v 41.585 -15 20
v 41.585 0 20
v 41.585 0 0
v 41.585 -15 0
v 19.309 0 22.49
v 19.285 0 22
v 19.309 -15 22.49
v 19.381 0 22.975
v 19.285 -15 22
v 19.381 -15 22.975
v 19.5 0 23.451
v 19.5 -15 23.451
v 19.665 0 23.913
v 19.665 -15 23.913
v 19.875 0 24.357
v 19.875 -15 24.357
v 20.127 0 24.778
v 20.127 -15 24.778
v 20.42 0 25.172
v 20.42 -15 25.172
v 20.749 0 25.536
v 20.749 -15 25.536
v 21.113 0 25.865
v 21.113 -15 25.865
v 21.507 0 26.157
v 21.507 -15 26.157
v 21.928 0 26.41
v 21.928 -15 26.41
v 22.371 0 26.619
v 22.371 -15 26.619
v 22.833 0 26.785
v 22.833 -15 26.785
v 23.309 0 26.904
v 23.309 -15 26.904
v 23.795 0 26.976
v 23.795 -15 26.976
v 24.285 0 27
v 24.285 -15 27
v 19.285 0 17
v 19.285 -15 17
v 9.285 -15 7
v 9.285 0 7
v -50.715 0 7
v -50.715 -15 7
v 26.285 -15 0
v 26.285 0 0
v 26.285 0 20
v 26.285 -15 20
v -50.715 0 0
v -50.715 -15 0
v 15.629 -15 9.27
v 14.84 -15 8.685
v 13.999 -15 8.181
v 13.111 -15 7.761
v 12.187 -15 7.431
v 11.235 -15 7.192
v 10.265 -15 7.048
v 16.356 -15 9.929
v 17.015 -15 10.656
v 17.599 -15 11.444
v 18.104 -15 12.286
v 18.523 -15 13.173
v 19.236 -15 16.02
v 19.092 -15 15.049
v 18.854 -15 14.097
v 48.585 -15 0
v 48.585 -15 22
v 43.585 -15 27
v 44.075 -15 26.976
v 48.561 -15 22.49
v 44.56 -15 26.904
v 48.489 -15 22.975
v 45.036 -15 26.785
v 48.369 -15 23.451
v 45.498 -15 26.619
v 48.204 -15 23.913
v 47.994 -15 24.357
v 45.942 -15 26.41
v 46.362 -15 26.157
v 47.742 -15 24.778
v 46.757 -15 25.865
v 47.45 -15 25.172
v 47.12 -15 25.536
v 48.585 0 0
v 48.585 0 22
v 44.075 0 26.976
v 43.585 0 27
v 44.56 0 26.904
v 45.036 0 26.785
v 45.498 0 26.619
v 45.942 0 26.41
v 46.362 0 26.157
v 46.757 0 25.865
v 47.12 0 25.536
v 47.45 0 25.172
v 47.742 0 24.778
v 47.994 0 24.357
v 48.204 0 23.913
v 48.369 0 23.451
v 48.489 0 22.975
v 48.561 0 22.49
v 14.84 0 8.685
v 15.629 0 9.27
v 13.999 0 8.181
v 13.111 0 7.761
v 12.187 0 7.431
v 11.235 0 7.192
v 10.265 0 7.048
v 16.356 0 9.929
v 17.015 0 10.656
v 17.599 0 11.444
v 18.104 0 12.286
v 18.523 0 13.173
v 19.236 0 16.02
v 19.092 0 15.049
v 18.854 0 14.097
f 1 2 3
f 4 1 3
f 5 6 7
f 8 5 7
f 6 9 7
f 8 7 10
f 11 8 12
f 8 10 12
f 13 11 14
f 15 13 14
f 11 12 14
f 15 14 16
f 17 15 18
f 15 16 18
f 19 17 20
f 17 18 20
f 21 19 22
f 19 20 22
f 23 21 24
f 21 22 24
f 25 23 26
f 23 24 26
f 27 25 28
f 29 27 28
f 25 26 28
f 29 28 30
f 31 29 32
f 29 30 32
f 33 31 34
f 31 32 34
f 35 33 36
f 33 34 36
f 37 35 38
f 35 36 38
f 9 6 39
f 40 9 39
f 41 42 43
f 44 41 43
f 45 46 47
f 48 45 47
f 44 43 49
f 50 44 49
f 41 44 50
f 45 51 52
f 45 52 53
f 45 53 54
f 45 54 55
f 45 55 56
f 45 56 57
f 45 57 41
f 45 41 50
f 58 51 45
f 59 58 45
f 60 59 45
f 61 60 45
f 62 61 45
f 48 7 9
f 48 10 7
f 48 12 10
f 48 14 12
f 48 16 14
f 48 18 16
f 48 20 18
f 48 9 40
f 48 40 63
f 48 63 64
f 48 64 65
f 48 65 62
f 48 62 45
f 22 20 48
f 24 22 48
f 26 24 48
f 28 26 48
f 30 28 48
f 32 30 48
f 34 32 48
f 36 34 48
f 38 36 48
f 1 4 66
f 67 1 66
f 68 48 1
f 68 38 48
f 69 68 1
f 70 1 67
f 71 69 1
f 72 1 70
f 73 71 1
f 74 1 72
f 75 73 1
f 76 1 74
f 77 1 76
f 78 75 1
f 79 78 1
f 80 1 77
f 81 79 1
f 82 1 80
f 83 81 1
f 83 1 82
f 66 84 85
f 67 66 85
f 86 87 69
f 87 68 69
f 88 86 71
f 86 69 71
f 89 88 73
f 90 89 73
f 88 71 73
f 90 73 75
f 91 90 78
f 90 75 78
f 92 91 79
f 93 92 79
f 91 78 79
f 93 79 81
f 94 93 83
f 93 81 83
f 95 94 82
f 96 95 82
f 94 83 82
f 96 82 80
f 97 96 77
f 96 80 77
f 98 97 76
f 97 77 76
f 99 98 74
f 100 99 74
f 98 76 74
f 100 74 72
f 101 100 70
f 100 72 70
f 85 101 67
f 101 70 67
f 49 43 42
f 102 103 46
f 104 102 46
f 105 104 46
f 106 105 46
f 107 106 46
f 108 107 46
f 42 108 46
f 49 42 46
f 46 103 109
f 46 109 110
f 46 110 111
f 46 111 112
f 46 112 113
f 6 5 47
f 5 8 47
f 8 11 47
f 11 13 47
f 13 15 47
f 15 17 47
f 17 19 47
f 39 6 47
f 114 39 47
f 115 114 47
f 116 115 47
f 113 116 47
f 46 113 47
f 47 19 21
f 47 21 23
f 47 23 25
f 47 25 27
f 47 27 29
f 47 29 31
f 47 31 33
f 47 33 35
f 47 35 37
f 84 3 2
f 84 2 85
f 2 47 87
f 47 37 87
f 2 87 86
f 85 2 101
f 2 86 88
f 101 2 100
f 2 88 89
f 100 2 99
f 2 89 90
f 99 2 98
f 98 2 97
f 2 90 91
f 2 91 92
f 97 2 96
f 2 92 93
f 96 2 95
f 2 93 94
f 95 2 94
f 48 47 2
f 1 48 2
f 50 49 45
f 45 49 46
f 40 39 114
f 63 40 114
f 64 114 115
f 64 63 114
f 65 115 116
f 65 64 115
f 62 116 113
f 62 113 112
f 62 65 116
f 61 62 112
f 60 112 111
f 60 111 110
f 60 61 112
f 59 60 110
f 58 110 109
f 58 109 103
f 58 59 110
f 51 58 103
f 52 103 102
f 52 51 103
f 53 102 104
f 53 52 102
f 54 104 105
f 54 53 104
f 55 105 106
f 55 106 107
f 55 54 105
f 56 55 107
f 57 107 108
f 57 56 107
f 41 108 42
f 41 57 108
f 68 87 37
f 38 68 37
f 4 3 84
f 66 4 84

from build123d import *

# Parameters (mm, degrees)
F1_DEPTH = 15
F2_R     = 10
F3_R     = 5
F4_R     = 5


with BuildPart() as f1:
    # F0 (on Front) → F1 (new body)
    with BuildSketch(Plane.XZ):
        Polygon((41.584589, 20), (41.584589, 0), (48.584589, 0), (48.584589, 27), (19.284589, 27), (19.284589, 7), (-45.715411, 7), (-50.715411, 7), (-50.715411, 0), (26.284589, 0), (26.284589, 20), align=None)
    extrude(amount=F1_DEPTH)

    # F2
    f2_edges = [f1.edges().sort_by_distance(p)[0] for p in [
        (19.284589, -7.5, 7),
    ]]
    fillet(f2_edges, radius=F2_R)

    # F3
    f3_edges = [f1.edges().sort_by_distance(p)[0] for p in [
        (19.284589, -7.5, 27),
    ]]
    fillet(f3_edges, radius=F3_R)

    # F4
    f4_edges = [f1.edges().sort_by_distance(p)[0] for p in [
        (48.584589, -7.5, 27),
    ]]
    fillet(f4_edges, radius=F4_R)


solid = f1.part
